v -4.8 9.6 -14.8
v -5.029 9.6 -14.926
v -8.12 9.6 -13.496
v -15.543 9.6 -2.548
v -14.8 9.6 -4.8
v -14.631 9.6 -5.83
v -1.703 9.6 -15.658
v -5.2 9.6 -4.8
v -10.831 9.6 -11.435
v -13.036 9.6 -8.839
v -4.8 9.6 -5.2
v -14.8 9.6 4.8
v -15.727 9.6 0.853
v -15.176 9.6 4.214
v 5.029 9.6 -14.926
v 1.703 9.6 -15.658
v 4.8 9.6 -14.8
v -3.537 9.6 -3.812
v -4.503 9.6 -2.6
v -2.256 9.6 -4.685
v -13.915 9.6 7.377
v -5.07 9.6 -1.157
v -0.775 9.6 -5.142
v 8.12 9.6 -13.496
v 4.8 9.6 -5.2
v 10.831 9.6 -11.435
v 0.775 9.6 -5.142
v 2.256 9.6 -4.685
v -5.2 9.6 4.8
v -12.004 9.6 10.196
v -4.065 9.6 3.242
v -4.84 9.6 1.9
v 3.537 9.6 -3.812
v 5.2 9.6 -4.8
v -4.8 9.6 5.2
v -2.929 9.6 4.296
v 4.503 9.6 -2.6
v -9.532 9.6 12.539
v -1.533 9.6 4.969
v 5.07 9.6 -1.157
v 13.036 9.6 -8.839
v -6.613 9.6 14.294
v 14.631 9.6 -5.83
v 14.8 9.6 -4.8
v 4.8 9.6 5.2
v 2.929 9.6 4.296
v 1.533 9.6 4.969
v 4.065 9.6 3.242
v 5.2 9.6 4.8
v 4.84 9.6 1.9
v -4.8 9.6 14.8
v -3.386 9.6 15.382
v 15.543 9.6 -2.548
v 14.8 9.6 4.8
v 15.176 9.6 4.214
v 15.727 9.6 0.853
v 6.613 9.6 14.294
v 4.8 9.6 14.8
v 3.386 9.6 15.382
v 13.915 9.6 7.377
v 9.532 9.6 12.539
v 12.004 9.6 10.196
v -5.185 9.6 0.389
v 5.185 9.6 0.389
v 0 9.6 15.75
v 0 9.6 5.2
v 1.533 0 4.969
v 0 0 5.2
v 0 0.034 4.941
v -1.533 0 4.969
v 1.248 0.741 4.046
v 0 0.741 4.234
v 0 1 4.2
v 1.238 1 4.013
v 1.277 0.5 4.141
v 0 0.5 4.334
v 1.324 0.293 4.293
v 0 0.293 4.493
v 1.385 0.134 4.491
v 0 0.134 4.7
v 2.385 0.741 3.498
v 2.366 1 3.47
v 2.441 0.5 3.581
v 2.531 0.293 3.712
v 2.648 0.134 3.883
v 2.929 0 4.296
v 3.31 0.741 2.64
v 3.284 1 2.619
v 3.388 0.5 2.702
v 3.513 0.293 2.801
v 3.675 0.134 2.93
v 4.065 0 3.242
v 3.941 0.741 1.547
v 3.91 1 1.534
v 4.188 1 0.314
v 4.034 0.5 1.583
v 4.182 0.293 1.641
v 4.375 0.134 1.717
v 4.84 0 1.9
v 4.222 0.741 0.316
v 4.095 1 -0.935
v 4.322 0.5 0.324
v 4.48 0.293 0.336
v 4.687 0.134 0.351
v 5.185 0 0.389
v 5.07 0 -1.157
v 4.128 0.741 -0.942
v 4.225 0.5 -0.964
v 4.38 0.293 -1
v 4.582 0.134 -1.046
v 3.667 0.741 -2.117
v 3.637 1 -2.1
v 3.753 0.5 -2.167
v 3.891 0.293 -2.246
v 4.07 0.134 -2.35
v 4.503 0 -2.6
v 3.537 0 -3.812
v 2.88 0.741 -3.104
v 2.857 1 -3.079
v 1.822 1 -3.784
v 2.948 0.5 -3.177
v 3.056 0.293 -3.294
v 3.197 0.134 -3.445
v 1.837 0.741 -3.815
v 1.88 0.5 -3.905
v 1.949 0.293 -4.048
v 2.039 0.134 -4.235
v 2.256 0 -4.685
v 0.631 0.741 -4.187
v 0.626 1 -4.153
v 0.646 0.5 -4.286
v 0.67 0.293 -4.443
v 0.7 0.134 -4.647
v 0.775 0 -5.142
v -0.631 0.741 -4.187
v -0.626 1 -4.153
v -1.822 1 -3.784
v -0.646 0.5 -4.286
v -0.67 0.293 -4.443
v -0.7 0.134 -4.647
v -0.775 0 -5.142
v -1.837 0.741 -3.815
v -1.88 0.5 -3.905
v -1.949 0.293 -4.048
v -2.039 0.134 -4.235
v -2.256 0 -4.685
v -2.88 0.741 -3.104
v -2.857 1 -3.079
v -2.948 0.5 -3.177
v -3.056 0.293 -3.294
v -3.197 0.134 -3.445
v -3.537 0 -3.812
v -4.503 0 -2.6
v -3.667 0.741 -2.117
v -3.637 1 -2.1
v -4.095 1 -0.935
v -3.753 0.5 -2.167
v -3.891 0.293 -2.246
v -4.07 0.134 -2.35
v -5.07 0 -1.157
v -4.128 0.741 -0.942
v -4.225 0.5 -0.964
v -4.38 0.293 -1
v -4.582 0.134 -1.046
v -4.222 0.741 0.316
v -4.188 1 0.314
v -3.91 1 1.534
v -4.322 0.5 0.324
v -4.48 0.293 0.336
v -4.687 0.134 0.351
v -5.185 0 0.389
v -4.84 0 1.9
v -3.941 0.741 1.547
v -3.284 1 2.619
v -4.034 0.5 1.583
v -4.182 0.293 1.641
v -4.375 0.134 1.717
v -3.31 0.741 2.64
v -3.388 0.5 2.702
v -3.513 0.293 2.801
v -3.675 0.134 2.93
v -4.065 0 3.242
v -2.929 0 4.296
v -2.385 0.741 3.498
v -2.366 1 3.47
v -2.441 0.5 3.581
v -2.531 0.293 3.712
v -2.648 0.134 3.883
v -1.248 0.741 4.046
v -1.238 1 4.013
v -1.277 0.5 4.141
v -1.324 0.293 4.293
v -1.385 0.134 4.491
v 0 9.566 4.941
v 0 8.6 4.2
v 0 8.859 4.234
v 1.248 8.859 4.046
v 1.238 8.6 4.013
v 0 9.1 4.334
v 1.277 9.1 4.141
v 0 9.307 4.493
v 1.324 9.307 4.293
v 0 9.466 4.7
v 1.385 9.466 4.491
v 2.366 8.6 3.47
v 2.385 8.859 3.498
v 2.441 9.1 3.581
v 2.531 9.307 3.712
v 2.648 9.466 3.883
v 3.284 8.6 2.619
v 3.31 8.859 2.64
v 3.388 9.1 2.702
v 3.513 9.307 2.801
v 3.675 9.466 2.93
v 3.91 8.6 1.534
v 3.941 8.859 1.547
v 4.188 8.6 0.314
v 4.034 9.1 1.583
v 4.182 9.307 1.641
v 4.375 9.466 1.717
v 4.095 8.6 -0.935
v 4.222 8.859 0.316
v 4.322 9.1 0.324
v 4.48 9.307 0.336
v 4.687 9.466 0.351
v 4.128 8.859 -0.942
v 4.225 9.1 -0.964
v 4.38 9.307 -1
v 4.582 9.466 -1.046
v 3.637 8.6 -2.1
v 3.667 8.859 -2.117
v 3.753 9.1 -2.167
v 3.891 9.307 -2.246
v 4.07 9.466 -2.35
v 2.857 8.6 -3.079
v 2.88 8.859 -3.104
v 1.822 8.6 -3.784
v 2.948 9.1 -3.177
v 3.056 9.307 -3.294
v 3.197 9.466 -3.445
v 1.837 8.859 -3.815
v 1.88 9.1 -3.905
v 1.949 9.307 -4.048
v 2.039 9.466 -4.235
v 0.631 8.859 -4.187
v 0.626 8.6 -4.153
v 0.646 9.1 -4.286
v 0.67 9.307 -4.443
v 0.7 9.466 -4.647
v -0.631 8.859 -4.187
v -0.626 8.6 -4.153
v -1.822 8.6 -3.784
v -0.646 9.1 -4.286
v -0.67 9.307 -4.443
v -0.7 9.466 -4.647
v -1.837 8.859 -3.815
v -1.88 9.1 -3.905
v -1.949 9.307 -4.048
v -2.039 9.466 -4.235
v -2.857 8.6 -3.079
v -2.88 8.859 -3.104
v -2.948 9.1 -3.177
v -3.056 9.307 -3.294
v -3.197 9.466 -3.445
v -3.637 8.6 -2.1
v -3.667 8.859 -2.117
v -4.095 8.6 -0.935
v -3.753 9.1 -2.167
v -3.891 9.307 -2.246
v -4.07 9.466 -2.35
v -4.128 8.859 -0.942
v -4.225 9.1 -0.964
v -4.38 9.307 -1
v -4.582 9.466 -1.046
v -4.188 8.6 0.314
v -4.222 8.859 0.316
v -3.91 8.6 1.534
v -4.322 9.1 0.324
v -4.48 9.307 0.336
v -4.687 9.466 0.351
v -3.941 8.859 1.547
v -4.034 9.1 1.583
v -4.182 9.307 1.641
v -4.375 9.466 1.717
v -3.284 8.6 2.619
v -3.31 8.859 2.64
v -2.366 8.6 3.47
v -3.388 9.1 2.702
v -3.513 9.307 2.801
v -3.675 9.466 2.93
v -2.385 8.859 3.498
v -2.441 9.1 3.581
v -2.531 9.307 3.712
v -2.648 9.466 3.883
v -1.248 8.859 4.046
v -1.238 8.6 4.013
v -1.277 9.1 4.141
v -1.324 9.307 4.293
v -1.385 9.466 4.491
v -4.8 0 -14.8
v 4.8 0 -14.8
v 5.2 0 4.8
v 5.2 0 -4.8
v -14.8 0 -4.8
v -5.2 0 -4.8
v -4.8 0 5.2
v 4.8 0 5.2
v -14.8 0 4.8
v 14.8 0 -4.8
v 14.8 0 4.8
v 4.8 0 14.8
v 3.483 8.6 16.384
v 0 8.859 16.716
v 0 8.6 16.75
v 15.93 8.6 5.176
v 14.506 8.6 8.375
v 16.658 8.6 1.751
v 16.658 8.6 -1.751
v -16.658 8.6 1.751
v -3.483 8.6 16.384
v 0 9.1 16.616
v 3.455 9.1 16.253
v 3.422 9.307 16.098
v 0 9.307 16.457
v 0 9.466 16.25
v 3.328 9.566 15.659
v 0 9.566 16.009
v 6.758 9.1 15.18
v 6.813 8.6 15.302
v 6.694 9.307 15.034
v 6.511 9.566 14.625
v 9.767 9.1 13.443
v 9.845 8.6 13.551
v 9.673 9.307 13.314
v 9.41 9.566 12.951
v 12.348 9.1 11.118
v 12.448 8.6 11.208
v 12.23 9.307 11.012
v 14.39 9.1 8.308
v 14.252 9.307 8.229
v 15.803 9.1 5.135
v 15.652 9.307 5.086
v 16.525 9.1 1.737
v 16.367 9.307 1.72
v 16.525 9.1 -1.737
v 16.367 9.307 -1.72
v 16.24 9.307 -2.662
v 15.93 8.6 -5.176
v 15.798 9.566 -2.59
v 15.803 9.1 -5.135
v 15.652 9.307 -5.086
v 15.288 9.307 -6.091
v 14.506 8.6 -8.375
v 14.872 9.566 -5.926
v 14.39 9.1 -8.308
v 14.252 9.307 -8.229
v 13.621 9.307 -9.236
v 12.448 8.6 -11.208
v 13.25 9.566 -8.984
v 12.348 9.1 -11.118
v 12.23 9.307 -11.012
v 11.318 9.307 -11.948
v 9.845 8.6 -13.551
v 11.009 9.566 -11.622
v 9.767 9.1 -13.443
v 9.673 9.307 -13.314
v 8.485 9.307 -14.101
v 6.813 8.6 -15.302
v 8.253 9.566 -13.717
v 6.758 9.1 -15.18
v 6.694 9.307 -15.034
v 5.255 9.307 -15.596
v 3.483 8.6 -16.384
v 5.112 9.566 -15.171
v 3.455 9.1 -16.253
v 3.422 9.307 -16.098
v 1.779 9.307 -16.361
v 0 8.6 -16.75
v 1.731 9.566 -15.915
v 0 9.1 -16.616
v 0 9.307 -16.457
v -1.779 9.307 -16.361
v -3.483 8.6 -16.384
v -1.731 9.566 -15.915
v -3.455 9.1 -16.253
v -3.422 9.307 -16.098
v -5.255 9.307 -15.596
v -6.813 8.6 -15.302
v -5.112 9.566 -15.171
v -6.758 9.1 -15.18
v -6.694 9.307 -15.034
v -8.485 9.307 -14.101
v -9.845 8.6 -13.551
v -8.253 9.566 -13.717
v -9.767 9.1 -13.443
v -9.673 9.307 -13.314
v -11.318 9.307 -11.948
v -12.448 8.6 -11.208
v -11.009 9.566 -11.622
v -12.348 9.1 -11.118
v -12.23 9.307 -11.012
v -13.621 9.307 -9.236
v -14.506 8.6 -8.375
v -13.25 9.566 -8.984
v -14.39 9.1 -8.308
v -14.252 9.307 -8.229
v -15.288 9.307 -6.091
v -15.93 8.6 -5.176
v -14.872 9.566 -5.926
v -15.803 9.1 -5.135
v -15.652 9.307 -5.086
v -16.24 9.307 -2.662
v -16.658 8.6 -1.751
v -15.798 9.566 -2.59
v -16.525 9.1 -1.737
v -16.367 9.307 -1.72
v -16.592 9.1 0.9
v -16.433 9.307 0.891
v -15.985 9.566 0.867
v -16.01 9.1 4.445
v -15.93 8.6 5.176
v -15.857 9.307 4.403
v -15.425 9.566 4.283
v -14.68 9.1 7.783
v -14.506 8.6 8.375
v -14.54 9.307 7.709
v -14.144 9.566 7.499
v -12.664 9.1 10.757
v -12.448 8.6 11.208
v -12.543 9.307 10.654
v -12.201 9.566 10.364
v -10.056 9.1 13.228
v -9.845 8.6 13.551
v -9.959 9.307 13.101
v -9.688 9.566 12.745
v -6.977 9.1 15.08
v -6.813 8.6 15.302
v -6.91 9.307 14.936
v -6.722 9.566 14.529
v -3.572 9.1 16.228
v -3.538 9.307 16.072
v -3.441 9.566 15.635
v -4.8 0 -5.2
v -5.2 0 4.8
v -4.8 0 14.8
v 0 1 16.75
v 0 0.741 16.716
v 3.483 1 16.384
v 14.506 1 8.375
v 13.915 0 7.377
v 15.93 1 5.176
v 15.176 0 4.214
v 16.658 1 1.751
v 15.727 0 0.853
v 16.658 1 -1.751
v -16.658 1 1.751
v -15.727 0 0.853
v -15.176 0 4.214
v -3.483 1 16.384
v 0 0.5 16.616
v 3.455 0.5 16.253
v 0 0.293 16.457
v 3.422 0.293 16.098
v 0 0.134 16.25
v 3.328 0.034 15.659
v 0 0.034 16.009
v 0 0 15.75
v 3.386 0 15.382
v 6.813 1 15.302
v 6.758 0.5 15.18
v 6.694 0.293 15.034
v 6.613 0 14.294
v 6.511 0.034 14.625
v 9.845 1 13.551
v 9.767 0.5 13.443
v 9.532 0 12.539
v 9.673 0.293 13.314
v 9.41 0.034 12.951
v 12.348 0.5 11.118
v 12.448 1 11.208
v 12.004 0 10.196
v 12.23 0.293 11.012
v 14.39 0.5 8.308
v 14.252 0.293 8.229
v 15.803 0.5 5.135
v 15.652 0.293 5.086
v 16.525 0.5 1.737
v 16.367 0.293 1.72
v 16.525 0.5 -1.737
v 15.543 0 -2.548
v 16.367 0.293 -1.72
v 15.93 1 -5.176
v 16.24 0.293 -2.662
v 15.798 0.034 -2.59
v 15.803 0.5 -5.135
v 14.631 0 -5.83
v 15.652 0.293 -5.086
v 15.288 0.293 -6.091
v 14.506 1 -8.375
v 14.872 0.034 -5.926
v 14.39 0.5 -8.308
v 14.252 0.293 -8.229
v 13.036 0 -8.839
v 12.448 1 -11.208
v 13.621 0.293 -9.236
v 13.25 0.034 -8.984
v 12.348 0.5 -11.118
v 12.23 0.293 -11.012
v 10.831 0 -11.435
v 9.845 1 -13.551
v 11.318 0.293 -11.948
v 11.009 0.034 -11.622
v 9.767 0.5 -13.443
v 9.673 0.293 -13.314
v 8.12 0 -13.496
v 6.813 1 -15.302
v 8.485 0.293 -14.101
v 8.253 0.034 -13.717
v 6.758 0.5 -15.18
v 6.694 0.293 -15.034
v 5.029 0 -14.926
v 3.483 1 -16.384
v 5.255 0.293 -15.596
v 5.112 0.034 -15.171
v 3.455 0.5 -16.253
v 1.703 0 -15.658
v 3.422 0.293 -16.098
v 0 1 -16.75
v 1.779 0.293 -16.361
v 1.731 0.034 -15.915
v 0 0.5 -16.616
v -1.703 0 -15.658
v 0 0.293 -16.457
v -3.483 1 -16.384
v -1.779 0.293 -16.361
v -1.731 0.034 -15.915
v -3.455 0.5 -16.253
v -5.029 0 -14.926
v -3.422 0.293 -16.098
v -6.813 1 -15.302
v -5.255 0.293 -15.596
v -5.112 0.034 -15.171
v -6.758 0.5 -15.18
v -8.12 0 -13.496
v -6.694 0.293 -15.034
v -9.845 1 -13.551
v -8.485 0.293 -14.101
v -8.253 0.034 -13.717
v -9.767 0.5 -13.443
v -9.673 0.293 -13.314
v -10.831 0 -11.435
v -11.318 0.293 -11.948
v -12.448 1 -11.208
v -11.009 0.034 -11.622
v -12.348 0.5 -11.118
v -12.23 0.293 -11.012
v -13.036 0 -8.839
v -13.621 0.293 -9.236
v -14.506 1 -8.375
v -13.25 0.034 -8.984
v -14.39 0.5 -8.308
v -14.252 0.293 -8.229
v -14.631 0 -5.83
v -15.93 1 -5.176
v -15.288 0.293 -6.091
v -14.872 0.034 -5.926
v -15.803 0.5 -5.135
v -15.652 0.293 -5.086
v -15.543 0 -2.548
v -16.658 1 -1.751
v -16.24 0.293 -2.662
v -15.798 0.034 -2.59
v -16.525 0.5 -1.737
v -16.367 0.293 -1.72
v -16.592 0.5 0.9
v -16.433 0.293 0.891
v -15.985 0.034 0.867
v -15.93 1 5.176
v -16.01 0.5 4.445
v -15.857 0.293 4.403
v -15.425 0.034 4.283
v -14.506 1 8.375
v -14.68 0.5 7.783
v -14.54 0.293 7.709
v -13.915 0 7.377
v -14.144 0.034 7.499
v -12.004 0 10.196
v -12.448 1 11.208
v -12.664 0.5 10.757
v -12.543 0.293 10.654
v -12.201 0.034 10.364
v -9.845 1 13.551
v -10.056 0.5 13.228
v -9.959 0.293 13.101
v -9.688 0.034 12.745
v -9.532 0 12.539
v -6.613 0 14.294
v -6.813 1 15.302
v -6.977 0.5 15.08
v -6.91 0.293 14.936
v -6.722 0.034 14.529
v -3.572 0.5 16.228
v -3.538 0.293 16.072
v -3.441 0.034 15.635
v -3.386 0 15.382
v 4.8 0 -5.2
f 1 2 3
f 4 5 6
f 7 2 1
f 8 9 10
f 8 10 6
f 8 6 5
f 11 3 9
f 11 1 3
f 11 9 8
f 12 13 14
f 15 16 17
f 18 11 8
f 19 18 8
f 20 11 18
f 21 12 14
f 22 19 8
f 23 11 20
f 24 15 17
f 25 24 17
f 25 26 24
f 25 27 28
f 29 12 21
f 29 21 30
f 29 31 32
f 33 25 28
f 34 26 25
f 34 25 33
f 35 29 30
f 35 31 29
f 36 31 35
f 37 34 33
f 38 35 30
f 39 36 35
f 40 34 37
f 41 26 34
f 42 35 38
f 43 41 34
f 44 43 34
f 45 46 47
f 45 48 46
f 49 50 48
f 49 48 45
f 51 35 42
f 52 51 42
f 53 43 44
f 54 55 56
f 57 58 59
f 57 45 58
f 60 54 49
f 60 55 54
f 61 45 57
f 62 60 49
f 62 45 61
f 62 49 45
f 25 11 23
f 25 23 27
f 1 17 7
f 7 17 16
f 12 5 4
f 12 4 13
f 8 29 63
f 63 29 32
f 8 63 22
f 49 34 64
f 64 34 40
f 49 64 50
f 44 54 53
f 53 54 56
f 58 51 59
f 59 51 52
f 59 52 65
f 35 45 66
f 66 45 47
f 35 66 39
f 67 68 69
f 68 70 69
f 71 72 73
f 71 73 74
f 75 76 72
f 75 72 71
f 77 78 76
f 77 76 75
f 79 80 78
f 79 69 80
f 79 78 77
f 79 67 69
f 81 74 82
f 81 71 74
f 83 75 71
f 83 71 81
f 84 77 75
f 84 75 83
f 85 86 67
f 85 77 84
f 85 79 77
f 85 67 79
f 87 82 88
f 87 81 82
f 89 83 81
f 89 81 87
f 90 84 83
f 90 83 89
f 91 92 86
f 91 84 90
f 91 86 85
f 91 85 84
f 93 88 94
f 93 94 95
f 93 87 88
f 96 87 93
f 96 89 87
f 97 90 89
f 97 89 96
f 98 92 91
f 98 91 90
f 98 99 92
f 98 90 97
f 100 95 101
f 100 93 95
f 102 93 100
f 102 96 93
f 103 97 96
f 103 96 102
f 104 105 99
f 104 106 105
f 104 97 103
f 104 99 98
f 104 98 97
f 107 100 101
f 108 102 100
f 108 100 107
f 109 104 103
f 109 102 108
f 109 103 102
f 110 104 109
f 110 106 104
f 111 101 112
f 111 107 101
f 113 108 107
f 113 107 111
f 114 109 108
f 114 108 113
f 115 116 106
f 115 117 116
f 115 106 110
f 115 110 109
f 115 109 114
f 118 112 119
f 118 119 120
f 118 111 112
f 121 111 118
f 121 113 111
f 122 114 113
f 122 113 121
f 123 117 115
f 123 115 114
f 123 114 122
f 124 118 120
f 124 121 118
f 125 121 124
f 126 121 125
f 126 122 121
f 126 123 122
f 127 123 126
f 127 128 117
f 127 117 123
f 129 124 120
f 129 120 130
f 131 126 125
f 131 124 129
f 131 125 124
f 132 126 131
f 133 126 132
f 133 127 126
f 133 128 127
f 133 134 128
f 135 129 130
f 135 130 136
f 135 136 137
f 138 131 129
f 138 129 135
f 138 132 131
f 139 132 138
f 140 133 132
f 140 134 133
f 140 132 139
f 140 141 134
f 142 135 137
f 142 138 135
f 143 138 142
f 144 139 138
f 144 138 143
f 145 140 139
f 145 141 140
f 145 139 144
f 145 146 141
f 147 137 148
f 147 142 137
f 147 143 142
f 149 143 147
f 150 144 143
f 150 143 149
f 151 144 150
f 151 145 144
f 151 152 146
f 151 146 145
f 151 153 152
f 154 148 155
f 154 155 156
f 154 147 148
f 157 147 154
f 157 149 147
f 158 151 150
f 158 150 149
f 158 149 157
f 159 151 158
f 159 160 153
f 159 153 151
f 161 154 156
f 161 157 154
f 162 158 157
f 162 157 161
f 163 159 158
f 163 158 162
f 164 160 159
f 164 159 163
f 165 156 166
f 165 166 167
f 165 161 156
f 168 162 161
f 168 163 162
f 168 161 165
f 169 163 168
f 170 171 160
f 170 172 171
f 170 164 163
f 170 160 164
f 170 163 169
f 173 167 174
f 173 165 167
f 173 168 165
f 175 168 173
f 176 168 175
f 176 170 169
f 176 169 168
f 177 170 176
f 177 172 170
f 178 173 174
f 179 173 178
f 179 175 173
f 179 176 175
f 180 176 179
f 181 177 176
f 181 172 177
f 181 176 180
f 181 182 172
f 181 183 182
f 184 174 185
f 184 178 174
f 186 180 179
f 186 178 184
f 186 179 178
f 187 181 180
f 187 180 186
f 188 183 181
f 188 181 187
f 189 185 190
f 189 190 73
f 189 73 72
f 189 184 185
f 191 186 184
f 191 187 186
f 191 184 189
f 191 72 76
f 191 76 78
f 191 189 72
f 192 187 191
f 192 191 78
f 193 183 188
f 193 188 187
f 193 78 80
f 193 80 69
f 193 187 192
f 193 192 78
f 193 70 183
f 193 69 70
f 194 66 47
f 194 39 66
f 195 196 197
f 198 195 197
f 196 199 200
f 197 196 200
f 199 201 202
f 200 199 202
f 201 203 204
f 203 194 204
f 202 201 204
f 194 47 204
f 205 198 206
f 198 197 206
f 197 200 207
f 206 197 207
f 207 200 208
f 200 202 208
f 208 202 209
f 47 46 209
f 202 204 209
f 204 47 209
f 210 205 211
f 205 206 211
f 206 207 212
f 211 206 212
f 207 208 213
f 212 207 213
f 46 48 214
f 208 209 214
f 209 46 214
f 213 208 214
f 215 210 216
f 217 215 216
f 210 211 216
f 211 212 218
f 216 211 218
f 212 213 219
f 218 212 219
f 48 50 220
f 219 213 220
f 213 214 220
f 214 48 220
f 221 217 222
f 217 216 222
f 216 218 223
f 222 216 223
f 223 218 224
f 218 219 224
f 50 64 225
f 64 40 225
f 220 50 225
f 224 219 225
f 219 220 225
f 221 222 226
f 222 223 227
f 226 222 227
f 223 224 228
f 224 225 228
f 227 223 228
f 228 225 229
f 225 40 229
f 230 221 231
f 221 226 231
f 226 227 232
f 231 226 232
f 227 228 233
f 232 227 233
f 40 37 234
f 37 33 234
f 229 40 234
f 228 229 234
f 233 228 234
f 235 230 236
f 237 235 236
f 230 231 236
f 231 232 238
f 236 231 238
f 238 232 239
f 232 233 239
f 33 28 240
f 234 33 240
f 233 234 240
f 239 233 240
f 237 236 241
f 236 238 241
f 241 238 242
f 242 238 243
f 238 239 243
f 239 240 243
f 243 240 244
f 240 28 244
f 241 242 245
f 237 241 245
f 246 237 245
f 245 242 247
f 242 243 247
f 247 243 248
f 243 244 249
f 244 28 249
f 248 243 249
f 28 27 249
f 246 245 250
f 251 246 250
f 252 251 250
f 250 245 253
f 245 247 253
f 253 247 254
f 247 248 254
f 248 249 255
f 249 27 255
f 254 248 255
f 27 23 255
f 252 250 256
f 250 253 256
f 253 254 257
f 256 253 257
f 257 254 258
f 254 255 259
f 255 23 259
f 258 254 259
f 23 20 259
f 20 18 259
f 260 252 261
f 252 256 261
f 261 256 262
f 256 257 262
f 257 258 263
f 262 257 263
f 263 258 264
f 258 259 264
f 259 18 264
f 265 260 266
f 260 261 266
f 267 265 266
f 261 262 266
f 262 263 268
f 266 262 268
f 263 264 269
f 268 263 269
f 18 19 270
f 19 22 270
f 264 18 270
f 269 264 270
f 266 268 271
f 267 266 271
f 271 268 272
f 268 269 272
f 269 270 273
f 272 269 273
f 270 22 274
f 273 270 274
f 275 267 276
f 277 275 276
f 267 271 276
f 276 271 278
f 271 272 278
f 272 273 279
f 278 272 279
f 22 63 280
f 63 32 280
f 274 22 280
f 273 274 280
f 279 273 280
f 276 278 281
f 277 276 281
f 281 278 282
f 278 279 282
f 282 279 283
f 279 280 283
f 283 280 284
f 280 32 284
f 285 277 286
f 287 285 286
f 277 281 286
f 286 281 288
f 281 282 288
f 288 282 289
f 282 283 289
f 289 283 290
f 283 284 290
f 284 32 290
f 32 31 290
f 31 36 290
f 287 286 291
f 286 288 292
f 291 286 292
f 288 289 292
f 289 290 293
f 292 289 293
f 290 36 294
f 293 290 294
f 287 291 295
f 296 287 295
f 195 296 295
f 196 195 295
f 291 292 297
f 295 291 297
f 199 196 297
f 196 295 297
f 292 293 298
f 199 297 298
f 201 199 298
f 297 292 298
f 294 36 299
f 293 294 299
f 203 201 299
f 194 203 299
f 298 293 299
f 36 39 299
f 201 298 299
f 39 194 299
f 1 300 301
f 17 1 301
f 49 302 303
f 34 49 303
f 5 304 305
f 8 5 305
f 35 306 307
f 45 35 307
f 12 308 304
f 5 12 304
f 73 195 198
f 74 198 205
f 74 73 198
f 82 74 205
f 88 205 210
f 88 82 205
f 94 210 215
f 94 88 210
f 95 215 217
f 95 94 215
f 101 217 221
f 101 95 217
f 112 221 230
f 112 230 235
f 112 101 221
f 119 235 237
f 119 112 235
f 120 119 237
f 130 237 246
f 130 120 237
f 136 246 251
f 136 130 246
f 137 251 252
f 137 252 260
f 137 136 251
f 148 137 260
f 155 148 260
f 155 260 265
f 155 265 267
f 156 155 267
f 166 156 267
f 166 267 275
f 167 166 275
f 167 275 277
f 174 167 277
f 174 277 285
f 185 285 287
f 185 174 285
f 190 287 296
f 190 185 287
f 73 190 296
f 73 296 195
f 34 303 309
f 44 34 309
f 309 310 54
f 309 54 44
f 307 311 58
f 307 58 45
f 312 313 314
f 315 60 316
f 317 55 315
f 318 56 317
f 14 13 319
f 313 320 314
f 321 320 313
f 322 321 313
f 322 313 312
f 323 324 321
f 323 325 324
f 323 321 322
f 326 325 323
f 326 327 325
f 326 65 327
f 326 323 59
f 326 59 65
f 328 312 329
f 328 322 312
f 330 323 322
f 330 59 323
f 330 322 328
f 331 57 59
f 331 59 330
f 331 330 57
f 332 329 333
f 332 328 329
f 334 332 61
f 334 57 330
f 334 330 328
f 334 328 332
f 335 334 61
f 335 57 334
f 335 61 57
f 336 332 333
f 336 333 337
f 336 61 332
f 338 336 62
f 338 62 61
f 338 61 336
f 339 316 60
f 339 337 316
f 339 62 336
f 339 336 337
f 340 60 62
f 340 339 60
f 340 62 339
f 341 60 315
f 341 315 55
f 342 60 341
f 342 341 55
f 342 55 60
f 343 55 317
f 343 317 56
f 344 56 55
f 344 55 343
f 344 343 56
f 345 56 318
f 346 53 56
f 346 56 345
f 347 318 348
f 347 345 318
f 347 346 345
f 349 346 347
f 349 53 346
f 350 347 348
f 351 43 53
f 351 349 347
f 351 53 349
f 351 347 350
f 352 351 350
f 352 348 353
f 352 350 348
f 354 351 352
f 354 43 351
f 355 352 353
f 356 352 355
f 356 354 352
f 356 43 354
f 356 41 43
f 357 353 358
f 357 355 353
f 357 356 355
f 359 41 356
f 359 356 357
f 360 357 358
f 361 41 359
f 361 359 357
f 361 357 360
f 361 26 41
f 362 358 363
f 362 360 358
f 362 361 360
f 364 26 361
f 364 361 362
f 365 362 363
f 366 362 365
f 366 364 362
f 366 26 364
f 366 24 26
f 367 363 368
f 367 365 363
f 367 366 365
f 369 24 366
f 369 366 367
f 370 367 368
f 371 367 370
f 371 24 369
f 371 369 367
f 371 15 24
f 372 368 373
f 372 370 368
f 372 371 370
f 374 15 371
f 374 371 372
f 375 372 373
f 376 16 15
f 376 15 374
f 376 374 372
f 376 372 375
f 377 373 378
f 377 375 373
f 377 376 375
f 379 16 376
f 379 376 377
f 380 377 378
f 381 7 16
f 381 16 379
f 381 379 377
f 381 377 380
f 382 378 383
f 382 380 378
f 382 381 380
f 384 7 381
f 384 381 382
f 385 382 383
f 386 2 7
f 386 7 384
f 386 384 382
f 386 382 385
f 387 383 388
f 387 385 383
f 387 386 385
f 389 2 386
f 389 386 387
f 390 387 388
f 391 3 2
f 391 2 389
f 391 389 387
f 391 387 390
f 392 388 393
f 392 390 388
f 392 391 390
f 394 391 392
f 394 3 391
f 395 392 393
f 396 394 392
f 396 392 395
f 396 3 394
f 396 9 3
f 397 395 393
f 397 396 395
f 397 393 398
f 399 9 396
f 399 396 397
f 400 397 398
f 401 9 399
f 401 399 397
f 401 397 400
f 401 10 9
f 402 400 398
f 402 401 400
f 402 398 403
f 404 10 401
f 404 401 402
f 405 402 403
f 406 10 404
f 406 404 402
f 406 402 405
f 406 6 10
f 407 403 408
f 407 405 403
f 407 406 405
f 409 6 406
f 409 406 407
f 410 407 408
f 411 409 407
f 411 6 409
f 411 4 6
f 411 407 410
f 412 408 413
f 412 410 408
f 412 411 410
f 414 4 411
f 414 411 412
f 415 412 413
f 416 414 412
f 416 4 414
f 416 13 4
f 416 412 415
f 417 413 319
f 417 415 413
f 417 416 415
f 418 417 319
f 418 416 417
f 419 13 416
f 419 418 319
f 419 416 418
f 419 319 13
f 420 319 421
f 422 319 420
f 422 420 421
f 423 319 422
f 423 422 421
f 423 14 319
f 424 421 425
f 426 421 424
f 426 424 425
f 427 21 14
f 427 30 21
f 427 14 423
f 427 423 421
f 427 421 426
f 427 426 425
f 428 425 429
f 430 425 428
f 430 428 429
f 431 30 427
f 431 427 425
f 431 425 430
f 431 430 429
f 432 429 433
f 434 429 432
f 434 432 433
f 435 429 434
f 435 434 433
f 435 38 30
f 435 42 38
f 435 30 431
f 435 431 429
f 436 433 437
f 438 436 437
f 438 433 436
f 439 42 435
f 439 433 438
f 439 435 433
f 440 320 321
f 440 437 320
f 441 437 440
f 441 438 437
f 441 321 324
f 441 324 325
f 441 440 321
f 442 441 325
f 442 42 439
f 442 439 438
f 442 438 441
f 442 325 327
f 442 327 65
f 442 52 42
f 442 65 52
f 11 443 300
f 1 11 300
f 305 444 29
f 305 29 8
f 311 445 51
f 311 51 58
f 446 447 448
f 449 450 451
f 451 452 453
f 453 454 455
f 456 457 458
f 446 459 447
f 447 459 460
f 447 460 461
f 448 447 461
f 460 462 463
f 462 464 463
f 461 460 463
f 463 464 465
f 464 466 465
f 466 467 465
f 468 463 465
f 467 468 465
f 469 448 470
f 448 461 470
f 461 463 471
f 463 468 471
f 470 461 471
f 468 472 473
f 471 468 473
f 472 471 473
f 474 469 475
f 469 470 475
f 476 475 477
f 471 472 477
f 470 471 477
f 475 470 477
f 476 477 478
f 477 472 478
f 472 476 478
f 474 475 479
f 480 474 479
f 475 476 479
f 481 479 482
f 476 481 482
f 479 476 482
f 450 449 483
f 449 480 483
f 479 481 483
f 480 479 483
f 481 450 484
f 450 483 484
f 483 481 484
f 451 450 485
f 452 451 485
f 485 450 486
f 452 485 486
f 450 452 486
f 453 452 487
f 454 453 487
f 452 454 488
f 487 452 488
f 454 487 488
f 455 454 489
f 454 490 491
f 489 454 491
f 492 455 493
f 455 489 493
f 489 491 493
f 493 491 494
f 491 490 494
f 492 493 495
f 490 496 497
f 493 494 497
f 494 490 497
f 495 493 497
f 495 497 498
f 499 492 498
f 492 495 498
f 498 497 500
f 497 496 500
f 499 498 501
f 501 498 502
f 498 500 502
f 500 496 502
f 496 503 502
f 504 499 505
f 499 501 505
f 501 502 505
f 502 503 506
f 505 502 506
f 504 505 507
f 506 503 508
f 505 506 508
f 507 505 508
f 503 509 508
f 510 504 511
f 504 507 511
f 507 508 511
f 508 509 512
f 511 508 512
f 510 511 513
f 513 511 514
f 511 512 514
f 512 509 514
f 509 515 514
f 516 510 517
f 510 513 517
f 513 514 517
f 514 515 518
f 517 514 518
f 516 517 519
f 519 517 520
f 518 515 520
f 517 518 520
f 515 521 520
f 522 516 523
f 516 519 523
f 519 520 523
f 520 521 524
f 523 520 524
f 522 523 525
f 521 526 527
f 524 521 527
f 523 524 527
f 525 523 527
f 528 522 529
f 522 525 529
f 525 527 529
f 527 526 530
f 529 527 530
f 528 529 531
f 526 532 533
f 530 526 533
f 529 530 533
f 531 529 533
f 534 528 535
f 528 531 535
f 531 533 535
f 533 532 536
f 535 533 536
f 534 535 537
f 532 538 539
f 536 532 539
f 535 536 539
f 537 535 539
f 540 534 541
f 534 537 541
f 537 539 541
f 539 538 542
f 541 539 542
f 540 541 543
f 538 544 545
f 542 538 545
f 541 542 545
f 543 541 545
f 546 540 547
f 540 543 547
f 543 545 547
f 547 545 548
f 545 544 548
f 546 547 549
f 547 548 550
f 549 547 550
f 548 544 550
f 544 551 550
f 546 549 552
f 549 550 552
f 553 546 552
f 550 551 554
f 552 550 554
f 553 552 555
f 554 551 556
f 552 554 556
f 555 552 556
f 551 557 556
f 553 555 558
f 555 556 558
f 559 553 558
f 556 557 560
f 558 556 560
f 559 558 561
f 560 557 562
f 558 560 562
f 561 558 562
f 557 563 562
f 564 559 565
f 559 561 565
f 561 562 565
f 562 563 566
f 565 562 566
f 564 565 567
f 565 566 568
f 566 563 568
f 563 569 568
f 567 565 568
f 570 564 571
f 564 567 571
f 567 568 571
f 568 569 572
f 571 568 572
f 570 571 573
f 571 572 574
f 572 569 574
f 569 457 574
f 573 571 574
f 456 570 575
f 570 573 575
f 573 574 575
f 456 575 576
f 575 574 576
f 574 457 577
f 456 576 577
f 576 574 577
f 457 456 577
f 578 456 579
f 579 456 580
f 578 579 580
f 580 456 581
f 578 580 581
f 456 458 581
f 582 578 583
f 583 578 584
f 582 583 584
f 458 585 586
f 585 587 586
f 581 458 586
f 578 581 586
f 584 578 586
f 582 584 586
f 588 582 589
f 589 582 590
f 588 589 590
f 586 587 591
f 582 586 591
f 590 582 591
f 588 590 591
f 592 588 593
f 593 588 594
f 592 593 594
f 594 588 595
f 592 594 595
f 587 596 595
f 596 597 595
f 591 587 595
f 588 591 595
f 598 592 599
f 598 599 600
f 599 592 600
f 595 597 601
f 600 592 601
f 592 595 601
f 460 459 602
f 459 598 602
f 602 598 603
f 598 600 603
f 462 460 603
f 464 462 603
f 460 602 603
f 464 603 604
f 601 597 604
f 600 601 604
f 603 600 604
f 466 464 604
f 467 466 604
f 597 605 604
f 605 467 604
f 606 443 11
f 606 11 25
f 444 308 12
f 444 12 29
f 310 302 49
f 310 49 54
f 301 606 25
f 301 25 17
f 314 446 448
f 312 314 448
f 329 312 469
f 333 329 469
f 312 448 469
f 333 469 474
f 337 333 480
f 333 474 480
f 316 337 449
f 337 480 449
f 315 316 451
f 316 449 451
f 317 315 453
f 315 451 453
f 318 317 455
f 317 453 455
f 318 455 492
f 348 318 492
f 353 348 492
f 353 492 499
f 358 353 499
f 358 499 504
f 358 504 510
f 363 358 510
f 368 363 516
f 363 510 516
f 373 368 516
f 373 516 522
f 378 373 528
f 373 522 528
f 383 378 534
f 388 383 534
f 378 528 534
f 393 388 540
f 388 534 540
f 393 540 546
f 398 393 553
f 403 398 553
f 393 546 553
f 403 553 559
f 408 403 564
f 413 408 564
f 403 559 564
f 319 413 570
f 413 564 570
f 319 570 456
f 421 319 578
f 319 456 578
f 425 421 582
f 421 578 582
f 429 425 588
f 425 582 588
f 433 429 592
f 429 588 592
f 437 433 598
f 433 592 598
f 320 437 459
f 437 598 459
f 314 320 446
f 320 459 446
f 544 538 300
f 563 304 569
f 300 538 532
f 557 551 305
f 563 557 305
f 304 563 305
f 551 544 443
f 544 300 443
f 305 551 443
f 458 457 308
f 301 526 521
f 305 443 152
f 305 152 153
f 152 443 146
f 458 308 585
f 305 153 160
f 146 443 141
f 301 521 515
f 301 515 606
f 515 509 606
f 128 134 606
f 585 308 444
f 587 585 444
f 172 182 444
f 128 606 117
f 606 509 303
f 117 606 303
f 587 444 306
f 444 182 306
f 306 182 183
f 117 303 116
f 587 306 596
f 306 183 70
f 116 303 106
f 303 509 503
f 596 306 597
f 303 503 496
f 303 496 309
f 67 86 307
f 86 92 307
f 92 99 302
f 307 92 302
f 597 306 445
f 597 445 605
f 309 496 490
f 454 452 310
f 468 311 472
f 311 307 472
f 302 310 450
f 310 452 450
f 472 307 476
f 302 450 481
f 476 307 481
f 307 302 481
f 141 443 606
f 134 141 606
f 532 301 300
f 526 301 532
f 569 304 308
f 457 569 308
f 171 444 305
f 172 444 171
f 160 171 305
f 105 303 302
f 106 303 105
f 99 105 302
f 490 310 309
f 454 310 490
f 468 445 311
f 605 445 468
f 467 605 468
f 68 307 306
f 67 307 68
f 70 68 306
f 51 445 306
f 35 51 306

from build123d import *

# Parameters (mm, degrees)
SKIZZE1_R                       = 16.75
SKIZZE1_R_2                     = 4.2
SKIZZE1_W                       = 9.6
SKIZZE1_H                       = 9.6
AUFSATZ_LINEAR_AUSTRAGEN1_DEPTH = 9.6
VERRUNDUNG1_R                   = 1


with BuildPart() as part:
    # Skizze1 → Aufsatz-Linear austragen1 (new body)
    with BuildSketch(Plane(origin=(0, 0, 0), x_dir=(1, 0, 0), z_dir=(0, 1, 0))):
        with Locations(Location((0, 0, 0), (0, 0, 270))):
            Circle(SKIZZE1_R)
        with Locations(Location((0, 0, 0), (0, 0, 270))):
            Circle(SKIZZE1_R_2, mode=Mode.SUBTRACT)
        with Locations((0, 10)):
            Rectangle(SKIZZE1_W, SKIZZE1_H, mode=Mode.SUBTRACT)
        with Locations((10, 0)):
            Rectangle(SKIZZE1_W, SKIZZE1_H, mode=Mode.SUBTRACT)
        with Locations((0, -10)):
            Rectangle(SKIZZE1_W, SKIZZE1_H, mode=Mode.SUBTRACT)
        with Locations((-10, 0)):
            Rectangle(SKIZZE1_W, SKIZZE1_H, mode=Mode.SUBTRACT)
    extrude(amount=AUFSATZ_LINEAR_AUSTRAGEN1_DEPTH)

    # Verrundung1
    verrundung1_edges = [part.edges().sort_by_distance(p)[0] for p in [
        (0, 0, -4.2),
        (0, 9.6, -4.2),
        (0, 0, -16.75),
        (0, 9.6, -16.75),
    ]]
    fillet(verrundung1_edges, radius=VERRUNDUNG1_R - 0.0001)  # a hair under: the kernel refuses the full size


solid = part.part
